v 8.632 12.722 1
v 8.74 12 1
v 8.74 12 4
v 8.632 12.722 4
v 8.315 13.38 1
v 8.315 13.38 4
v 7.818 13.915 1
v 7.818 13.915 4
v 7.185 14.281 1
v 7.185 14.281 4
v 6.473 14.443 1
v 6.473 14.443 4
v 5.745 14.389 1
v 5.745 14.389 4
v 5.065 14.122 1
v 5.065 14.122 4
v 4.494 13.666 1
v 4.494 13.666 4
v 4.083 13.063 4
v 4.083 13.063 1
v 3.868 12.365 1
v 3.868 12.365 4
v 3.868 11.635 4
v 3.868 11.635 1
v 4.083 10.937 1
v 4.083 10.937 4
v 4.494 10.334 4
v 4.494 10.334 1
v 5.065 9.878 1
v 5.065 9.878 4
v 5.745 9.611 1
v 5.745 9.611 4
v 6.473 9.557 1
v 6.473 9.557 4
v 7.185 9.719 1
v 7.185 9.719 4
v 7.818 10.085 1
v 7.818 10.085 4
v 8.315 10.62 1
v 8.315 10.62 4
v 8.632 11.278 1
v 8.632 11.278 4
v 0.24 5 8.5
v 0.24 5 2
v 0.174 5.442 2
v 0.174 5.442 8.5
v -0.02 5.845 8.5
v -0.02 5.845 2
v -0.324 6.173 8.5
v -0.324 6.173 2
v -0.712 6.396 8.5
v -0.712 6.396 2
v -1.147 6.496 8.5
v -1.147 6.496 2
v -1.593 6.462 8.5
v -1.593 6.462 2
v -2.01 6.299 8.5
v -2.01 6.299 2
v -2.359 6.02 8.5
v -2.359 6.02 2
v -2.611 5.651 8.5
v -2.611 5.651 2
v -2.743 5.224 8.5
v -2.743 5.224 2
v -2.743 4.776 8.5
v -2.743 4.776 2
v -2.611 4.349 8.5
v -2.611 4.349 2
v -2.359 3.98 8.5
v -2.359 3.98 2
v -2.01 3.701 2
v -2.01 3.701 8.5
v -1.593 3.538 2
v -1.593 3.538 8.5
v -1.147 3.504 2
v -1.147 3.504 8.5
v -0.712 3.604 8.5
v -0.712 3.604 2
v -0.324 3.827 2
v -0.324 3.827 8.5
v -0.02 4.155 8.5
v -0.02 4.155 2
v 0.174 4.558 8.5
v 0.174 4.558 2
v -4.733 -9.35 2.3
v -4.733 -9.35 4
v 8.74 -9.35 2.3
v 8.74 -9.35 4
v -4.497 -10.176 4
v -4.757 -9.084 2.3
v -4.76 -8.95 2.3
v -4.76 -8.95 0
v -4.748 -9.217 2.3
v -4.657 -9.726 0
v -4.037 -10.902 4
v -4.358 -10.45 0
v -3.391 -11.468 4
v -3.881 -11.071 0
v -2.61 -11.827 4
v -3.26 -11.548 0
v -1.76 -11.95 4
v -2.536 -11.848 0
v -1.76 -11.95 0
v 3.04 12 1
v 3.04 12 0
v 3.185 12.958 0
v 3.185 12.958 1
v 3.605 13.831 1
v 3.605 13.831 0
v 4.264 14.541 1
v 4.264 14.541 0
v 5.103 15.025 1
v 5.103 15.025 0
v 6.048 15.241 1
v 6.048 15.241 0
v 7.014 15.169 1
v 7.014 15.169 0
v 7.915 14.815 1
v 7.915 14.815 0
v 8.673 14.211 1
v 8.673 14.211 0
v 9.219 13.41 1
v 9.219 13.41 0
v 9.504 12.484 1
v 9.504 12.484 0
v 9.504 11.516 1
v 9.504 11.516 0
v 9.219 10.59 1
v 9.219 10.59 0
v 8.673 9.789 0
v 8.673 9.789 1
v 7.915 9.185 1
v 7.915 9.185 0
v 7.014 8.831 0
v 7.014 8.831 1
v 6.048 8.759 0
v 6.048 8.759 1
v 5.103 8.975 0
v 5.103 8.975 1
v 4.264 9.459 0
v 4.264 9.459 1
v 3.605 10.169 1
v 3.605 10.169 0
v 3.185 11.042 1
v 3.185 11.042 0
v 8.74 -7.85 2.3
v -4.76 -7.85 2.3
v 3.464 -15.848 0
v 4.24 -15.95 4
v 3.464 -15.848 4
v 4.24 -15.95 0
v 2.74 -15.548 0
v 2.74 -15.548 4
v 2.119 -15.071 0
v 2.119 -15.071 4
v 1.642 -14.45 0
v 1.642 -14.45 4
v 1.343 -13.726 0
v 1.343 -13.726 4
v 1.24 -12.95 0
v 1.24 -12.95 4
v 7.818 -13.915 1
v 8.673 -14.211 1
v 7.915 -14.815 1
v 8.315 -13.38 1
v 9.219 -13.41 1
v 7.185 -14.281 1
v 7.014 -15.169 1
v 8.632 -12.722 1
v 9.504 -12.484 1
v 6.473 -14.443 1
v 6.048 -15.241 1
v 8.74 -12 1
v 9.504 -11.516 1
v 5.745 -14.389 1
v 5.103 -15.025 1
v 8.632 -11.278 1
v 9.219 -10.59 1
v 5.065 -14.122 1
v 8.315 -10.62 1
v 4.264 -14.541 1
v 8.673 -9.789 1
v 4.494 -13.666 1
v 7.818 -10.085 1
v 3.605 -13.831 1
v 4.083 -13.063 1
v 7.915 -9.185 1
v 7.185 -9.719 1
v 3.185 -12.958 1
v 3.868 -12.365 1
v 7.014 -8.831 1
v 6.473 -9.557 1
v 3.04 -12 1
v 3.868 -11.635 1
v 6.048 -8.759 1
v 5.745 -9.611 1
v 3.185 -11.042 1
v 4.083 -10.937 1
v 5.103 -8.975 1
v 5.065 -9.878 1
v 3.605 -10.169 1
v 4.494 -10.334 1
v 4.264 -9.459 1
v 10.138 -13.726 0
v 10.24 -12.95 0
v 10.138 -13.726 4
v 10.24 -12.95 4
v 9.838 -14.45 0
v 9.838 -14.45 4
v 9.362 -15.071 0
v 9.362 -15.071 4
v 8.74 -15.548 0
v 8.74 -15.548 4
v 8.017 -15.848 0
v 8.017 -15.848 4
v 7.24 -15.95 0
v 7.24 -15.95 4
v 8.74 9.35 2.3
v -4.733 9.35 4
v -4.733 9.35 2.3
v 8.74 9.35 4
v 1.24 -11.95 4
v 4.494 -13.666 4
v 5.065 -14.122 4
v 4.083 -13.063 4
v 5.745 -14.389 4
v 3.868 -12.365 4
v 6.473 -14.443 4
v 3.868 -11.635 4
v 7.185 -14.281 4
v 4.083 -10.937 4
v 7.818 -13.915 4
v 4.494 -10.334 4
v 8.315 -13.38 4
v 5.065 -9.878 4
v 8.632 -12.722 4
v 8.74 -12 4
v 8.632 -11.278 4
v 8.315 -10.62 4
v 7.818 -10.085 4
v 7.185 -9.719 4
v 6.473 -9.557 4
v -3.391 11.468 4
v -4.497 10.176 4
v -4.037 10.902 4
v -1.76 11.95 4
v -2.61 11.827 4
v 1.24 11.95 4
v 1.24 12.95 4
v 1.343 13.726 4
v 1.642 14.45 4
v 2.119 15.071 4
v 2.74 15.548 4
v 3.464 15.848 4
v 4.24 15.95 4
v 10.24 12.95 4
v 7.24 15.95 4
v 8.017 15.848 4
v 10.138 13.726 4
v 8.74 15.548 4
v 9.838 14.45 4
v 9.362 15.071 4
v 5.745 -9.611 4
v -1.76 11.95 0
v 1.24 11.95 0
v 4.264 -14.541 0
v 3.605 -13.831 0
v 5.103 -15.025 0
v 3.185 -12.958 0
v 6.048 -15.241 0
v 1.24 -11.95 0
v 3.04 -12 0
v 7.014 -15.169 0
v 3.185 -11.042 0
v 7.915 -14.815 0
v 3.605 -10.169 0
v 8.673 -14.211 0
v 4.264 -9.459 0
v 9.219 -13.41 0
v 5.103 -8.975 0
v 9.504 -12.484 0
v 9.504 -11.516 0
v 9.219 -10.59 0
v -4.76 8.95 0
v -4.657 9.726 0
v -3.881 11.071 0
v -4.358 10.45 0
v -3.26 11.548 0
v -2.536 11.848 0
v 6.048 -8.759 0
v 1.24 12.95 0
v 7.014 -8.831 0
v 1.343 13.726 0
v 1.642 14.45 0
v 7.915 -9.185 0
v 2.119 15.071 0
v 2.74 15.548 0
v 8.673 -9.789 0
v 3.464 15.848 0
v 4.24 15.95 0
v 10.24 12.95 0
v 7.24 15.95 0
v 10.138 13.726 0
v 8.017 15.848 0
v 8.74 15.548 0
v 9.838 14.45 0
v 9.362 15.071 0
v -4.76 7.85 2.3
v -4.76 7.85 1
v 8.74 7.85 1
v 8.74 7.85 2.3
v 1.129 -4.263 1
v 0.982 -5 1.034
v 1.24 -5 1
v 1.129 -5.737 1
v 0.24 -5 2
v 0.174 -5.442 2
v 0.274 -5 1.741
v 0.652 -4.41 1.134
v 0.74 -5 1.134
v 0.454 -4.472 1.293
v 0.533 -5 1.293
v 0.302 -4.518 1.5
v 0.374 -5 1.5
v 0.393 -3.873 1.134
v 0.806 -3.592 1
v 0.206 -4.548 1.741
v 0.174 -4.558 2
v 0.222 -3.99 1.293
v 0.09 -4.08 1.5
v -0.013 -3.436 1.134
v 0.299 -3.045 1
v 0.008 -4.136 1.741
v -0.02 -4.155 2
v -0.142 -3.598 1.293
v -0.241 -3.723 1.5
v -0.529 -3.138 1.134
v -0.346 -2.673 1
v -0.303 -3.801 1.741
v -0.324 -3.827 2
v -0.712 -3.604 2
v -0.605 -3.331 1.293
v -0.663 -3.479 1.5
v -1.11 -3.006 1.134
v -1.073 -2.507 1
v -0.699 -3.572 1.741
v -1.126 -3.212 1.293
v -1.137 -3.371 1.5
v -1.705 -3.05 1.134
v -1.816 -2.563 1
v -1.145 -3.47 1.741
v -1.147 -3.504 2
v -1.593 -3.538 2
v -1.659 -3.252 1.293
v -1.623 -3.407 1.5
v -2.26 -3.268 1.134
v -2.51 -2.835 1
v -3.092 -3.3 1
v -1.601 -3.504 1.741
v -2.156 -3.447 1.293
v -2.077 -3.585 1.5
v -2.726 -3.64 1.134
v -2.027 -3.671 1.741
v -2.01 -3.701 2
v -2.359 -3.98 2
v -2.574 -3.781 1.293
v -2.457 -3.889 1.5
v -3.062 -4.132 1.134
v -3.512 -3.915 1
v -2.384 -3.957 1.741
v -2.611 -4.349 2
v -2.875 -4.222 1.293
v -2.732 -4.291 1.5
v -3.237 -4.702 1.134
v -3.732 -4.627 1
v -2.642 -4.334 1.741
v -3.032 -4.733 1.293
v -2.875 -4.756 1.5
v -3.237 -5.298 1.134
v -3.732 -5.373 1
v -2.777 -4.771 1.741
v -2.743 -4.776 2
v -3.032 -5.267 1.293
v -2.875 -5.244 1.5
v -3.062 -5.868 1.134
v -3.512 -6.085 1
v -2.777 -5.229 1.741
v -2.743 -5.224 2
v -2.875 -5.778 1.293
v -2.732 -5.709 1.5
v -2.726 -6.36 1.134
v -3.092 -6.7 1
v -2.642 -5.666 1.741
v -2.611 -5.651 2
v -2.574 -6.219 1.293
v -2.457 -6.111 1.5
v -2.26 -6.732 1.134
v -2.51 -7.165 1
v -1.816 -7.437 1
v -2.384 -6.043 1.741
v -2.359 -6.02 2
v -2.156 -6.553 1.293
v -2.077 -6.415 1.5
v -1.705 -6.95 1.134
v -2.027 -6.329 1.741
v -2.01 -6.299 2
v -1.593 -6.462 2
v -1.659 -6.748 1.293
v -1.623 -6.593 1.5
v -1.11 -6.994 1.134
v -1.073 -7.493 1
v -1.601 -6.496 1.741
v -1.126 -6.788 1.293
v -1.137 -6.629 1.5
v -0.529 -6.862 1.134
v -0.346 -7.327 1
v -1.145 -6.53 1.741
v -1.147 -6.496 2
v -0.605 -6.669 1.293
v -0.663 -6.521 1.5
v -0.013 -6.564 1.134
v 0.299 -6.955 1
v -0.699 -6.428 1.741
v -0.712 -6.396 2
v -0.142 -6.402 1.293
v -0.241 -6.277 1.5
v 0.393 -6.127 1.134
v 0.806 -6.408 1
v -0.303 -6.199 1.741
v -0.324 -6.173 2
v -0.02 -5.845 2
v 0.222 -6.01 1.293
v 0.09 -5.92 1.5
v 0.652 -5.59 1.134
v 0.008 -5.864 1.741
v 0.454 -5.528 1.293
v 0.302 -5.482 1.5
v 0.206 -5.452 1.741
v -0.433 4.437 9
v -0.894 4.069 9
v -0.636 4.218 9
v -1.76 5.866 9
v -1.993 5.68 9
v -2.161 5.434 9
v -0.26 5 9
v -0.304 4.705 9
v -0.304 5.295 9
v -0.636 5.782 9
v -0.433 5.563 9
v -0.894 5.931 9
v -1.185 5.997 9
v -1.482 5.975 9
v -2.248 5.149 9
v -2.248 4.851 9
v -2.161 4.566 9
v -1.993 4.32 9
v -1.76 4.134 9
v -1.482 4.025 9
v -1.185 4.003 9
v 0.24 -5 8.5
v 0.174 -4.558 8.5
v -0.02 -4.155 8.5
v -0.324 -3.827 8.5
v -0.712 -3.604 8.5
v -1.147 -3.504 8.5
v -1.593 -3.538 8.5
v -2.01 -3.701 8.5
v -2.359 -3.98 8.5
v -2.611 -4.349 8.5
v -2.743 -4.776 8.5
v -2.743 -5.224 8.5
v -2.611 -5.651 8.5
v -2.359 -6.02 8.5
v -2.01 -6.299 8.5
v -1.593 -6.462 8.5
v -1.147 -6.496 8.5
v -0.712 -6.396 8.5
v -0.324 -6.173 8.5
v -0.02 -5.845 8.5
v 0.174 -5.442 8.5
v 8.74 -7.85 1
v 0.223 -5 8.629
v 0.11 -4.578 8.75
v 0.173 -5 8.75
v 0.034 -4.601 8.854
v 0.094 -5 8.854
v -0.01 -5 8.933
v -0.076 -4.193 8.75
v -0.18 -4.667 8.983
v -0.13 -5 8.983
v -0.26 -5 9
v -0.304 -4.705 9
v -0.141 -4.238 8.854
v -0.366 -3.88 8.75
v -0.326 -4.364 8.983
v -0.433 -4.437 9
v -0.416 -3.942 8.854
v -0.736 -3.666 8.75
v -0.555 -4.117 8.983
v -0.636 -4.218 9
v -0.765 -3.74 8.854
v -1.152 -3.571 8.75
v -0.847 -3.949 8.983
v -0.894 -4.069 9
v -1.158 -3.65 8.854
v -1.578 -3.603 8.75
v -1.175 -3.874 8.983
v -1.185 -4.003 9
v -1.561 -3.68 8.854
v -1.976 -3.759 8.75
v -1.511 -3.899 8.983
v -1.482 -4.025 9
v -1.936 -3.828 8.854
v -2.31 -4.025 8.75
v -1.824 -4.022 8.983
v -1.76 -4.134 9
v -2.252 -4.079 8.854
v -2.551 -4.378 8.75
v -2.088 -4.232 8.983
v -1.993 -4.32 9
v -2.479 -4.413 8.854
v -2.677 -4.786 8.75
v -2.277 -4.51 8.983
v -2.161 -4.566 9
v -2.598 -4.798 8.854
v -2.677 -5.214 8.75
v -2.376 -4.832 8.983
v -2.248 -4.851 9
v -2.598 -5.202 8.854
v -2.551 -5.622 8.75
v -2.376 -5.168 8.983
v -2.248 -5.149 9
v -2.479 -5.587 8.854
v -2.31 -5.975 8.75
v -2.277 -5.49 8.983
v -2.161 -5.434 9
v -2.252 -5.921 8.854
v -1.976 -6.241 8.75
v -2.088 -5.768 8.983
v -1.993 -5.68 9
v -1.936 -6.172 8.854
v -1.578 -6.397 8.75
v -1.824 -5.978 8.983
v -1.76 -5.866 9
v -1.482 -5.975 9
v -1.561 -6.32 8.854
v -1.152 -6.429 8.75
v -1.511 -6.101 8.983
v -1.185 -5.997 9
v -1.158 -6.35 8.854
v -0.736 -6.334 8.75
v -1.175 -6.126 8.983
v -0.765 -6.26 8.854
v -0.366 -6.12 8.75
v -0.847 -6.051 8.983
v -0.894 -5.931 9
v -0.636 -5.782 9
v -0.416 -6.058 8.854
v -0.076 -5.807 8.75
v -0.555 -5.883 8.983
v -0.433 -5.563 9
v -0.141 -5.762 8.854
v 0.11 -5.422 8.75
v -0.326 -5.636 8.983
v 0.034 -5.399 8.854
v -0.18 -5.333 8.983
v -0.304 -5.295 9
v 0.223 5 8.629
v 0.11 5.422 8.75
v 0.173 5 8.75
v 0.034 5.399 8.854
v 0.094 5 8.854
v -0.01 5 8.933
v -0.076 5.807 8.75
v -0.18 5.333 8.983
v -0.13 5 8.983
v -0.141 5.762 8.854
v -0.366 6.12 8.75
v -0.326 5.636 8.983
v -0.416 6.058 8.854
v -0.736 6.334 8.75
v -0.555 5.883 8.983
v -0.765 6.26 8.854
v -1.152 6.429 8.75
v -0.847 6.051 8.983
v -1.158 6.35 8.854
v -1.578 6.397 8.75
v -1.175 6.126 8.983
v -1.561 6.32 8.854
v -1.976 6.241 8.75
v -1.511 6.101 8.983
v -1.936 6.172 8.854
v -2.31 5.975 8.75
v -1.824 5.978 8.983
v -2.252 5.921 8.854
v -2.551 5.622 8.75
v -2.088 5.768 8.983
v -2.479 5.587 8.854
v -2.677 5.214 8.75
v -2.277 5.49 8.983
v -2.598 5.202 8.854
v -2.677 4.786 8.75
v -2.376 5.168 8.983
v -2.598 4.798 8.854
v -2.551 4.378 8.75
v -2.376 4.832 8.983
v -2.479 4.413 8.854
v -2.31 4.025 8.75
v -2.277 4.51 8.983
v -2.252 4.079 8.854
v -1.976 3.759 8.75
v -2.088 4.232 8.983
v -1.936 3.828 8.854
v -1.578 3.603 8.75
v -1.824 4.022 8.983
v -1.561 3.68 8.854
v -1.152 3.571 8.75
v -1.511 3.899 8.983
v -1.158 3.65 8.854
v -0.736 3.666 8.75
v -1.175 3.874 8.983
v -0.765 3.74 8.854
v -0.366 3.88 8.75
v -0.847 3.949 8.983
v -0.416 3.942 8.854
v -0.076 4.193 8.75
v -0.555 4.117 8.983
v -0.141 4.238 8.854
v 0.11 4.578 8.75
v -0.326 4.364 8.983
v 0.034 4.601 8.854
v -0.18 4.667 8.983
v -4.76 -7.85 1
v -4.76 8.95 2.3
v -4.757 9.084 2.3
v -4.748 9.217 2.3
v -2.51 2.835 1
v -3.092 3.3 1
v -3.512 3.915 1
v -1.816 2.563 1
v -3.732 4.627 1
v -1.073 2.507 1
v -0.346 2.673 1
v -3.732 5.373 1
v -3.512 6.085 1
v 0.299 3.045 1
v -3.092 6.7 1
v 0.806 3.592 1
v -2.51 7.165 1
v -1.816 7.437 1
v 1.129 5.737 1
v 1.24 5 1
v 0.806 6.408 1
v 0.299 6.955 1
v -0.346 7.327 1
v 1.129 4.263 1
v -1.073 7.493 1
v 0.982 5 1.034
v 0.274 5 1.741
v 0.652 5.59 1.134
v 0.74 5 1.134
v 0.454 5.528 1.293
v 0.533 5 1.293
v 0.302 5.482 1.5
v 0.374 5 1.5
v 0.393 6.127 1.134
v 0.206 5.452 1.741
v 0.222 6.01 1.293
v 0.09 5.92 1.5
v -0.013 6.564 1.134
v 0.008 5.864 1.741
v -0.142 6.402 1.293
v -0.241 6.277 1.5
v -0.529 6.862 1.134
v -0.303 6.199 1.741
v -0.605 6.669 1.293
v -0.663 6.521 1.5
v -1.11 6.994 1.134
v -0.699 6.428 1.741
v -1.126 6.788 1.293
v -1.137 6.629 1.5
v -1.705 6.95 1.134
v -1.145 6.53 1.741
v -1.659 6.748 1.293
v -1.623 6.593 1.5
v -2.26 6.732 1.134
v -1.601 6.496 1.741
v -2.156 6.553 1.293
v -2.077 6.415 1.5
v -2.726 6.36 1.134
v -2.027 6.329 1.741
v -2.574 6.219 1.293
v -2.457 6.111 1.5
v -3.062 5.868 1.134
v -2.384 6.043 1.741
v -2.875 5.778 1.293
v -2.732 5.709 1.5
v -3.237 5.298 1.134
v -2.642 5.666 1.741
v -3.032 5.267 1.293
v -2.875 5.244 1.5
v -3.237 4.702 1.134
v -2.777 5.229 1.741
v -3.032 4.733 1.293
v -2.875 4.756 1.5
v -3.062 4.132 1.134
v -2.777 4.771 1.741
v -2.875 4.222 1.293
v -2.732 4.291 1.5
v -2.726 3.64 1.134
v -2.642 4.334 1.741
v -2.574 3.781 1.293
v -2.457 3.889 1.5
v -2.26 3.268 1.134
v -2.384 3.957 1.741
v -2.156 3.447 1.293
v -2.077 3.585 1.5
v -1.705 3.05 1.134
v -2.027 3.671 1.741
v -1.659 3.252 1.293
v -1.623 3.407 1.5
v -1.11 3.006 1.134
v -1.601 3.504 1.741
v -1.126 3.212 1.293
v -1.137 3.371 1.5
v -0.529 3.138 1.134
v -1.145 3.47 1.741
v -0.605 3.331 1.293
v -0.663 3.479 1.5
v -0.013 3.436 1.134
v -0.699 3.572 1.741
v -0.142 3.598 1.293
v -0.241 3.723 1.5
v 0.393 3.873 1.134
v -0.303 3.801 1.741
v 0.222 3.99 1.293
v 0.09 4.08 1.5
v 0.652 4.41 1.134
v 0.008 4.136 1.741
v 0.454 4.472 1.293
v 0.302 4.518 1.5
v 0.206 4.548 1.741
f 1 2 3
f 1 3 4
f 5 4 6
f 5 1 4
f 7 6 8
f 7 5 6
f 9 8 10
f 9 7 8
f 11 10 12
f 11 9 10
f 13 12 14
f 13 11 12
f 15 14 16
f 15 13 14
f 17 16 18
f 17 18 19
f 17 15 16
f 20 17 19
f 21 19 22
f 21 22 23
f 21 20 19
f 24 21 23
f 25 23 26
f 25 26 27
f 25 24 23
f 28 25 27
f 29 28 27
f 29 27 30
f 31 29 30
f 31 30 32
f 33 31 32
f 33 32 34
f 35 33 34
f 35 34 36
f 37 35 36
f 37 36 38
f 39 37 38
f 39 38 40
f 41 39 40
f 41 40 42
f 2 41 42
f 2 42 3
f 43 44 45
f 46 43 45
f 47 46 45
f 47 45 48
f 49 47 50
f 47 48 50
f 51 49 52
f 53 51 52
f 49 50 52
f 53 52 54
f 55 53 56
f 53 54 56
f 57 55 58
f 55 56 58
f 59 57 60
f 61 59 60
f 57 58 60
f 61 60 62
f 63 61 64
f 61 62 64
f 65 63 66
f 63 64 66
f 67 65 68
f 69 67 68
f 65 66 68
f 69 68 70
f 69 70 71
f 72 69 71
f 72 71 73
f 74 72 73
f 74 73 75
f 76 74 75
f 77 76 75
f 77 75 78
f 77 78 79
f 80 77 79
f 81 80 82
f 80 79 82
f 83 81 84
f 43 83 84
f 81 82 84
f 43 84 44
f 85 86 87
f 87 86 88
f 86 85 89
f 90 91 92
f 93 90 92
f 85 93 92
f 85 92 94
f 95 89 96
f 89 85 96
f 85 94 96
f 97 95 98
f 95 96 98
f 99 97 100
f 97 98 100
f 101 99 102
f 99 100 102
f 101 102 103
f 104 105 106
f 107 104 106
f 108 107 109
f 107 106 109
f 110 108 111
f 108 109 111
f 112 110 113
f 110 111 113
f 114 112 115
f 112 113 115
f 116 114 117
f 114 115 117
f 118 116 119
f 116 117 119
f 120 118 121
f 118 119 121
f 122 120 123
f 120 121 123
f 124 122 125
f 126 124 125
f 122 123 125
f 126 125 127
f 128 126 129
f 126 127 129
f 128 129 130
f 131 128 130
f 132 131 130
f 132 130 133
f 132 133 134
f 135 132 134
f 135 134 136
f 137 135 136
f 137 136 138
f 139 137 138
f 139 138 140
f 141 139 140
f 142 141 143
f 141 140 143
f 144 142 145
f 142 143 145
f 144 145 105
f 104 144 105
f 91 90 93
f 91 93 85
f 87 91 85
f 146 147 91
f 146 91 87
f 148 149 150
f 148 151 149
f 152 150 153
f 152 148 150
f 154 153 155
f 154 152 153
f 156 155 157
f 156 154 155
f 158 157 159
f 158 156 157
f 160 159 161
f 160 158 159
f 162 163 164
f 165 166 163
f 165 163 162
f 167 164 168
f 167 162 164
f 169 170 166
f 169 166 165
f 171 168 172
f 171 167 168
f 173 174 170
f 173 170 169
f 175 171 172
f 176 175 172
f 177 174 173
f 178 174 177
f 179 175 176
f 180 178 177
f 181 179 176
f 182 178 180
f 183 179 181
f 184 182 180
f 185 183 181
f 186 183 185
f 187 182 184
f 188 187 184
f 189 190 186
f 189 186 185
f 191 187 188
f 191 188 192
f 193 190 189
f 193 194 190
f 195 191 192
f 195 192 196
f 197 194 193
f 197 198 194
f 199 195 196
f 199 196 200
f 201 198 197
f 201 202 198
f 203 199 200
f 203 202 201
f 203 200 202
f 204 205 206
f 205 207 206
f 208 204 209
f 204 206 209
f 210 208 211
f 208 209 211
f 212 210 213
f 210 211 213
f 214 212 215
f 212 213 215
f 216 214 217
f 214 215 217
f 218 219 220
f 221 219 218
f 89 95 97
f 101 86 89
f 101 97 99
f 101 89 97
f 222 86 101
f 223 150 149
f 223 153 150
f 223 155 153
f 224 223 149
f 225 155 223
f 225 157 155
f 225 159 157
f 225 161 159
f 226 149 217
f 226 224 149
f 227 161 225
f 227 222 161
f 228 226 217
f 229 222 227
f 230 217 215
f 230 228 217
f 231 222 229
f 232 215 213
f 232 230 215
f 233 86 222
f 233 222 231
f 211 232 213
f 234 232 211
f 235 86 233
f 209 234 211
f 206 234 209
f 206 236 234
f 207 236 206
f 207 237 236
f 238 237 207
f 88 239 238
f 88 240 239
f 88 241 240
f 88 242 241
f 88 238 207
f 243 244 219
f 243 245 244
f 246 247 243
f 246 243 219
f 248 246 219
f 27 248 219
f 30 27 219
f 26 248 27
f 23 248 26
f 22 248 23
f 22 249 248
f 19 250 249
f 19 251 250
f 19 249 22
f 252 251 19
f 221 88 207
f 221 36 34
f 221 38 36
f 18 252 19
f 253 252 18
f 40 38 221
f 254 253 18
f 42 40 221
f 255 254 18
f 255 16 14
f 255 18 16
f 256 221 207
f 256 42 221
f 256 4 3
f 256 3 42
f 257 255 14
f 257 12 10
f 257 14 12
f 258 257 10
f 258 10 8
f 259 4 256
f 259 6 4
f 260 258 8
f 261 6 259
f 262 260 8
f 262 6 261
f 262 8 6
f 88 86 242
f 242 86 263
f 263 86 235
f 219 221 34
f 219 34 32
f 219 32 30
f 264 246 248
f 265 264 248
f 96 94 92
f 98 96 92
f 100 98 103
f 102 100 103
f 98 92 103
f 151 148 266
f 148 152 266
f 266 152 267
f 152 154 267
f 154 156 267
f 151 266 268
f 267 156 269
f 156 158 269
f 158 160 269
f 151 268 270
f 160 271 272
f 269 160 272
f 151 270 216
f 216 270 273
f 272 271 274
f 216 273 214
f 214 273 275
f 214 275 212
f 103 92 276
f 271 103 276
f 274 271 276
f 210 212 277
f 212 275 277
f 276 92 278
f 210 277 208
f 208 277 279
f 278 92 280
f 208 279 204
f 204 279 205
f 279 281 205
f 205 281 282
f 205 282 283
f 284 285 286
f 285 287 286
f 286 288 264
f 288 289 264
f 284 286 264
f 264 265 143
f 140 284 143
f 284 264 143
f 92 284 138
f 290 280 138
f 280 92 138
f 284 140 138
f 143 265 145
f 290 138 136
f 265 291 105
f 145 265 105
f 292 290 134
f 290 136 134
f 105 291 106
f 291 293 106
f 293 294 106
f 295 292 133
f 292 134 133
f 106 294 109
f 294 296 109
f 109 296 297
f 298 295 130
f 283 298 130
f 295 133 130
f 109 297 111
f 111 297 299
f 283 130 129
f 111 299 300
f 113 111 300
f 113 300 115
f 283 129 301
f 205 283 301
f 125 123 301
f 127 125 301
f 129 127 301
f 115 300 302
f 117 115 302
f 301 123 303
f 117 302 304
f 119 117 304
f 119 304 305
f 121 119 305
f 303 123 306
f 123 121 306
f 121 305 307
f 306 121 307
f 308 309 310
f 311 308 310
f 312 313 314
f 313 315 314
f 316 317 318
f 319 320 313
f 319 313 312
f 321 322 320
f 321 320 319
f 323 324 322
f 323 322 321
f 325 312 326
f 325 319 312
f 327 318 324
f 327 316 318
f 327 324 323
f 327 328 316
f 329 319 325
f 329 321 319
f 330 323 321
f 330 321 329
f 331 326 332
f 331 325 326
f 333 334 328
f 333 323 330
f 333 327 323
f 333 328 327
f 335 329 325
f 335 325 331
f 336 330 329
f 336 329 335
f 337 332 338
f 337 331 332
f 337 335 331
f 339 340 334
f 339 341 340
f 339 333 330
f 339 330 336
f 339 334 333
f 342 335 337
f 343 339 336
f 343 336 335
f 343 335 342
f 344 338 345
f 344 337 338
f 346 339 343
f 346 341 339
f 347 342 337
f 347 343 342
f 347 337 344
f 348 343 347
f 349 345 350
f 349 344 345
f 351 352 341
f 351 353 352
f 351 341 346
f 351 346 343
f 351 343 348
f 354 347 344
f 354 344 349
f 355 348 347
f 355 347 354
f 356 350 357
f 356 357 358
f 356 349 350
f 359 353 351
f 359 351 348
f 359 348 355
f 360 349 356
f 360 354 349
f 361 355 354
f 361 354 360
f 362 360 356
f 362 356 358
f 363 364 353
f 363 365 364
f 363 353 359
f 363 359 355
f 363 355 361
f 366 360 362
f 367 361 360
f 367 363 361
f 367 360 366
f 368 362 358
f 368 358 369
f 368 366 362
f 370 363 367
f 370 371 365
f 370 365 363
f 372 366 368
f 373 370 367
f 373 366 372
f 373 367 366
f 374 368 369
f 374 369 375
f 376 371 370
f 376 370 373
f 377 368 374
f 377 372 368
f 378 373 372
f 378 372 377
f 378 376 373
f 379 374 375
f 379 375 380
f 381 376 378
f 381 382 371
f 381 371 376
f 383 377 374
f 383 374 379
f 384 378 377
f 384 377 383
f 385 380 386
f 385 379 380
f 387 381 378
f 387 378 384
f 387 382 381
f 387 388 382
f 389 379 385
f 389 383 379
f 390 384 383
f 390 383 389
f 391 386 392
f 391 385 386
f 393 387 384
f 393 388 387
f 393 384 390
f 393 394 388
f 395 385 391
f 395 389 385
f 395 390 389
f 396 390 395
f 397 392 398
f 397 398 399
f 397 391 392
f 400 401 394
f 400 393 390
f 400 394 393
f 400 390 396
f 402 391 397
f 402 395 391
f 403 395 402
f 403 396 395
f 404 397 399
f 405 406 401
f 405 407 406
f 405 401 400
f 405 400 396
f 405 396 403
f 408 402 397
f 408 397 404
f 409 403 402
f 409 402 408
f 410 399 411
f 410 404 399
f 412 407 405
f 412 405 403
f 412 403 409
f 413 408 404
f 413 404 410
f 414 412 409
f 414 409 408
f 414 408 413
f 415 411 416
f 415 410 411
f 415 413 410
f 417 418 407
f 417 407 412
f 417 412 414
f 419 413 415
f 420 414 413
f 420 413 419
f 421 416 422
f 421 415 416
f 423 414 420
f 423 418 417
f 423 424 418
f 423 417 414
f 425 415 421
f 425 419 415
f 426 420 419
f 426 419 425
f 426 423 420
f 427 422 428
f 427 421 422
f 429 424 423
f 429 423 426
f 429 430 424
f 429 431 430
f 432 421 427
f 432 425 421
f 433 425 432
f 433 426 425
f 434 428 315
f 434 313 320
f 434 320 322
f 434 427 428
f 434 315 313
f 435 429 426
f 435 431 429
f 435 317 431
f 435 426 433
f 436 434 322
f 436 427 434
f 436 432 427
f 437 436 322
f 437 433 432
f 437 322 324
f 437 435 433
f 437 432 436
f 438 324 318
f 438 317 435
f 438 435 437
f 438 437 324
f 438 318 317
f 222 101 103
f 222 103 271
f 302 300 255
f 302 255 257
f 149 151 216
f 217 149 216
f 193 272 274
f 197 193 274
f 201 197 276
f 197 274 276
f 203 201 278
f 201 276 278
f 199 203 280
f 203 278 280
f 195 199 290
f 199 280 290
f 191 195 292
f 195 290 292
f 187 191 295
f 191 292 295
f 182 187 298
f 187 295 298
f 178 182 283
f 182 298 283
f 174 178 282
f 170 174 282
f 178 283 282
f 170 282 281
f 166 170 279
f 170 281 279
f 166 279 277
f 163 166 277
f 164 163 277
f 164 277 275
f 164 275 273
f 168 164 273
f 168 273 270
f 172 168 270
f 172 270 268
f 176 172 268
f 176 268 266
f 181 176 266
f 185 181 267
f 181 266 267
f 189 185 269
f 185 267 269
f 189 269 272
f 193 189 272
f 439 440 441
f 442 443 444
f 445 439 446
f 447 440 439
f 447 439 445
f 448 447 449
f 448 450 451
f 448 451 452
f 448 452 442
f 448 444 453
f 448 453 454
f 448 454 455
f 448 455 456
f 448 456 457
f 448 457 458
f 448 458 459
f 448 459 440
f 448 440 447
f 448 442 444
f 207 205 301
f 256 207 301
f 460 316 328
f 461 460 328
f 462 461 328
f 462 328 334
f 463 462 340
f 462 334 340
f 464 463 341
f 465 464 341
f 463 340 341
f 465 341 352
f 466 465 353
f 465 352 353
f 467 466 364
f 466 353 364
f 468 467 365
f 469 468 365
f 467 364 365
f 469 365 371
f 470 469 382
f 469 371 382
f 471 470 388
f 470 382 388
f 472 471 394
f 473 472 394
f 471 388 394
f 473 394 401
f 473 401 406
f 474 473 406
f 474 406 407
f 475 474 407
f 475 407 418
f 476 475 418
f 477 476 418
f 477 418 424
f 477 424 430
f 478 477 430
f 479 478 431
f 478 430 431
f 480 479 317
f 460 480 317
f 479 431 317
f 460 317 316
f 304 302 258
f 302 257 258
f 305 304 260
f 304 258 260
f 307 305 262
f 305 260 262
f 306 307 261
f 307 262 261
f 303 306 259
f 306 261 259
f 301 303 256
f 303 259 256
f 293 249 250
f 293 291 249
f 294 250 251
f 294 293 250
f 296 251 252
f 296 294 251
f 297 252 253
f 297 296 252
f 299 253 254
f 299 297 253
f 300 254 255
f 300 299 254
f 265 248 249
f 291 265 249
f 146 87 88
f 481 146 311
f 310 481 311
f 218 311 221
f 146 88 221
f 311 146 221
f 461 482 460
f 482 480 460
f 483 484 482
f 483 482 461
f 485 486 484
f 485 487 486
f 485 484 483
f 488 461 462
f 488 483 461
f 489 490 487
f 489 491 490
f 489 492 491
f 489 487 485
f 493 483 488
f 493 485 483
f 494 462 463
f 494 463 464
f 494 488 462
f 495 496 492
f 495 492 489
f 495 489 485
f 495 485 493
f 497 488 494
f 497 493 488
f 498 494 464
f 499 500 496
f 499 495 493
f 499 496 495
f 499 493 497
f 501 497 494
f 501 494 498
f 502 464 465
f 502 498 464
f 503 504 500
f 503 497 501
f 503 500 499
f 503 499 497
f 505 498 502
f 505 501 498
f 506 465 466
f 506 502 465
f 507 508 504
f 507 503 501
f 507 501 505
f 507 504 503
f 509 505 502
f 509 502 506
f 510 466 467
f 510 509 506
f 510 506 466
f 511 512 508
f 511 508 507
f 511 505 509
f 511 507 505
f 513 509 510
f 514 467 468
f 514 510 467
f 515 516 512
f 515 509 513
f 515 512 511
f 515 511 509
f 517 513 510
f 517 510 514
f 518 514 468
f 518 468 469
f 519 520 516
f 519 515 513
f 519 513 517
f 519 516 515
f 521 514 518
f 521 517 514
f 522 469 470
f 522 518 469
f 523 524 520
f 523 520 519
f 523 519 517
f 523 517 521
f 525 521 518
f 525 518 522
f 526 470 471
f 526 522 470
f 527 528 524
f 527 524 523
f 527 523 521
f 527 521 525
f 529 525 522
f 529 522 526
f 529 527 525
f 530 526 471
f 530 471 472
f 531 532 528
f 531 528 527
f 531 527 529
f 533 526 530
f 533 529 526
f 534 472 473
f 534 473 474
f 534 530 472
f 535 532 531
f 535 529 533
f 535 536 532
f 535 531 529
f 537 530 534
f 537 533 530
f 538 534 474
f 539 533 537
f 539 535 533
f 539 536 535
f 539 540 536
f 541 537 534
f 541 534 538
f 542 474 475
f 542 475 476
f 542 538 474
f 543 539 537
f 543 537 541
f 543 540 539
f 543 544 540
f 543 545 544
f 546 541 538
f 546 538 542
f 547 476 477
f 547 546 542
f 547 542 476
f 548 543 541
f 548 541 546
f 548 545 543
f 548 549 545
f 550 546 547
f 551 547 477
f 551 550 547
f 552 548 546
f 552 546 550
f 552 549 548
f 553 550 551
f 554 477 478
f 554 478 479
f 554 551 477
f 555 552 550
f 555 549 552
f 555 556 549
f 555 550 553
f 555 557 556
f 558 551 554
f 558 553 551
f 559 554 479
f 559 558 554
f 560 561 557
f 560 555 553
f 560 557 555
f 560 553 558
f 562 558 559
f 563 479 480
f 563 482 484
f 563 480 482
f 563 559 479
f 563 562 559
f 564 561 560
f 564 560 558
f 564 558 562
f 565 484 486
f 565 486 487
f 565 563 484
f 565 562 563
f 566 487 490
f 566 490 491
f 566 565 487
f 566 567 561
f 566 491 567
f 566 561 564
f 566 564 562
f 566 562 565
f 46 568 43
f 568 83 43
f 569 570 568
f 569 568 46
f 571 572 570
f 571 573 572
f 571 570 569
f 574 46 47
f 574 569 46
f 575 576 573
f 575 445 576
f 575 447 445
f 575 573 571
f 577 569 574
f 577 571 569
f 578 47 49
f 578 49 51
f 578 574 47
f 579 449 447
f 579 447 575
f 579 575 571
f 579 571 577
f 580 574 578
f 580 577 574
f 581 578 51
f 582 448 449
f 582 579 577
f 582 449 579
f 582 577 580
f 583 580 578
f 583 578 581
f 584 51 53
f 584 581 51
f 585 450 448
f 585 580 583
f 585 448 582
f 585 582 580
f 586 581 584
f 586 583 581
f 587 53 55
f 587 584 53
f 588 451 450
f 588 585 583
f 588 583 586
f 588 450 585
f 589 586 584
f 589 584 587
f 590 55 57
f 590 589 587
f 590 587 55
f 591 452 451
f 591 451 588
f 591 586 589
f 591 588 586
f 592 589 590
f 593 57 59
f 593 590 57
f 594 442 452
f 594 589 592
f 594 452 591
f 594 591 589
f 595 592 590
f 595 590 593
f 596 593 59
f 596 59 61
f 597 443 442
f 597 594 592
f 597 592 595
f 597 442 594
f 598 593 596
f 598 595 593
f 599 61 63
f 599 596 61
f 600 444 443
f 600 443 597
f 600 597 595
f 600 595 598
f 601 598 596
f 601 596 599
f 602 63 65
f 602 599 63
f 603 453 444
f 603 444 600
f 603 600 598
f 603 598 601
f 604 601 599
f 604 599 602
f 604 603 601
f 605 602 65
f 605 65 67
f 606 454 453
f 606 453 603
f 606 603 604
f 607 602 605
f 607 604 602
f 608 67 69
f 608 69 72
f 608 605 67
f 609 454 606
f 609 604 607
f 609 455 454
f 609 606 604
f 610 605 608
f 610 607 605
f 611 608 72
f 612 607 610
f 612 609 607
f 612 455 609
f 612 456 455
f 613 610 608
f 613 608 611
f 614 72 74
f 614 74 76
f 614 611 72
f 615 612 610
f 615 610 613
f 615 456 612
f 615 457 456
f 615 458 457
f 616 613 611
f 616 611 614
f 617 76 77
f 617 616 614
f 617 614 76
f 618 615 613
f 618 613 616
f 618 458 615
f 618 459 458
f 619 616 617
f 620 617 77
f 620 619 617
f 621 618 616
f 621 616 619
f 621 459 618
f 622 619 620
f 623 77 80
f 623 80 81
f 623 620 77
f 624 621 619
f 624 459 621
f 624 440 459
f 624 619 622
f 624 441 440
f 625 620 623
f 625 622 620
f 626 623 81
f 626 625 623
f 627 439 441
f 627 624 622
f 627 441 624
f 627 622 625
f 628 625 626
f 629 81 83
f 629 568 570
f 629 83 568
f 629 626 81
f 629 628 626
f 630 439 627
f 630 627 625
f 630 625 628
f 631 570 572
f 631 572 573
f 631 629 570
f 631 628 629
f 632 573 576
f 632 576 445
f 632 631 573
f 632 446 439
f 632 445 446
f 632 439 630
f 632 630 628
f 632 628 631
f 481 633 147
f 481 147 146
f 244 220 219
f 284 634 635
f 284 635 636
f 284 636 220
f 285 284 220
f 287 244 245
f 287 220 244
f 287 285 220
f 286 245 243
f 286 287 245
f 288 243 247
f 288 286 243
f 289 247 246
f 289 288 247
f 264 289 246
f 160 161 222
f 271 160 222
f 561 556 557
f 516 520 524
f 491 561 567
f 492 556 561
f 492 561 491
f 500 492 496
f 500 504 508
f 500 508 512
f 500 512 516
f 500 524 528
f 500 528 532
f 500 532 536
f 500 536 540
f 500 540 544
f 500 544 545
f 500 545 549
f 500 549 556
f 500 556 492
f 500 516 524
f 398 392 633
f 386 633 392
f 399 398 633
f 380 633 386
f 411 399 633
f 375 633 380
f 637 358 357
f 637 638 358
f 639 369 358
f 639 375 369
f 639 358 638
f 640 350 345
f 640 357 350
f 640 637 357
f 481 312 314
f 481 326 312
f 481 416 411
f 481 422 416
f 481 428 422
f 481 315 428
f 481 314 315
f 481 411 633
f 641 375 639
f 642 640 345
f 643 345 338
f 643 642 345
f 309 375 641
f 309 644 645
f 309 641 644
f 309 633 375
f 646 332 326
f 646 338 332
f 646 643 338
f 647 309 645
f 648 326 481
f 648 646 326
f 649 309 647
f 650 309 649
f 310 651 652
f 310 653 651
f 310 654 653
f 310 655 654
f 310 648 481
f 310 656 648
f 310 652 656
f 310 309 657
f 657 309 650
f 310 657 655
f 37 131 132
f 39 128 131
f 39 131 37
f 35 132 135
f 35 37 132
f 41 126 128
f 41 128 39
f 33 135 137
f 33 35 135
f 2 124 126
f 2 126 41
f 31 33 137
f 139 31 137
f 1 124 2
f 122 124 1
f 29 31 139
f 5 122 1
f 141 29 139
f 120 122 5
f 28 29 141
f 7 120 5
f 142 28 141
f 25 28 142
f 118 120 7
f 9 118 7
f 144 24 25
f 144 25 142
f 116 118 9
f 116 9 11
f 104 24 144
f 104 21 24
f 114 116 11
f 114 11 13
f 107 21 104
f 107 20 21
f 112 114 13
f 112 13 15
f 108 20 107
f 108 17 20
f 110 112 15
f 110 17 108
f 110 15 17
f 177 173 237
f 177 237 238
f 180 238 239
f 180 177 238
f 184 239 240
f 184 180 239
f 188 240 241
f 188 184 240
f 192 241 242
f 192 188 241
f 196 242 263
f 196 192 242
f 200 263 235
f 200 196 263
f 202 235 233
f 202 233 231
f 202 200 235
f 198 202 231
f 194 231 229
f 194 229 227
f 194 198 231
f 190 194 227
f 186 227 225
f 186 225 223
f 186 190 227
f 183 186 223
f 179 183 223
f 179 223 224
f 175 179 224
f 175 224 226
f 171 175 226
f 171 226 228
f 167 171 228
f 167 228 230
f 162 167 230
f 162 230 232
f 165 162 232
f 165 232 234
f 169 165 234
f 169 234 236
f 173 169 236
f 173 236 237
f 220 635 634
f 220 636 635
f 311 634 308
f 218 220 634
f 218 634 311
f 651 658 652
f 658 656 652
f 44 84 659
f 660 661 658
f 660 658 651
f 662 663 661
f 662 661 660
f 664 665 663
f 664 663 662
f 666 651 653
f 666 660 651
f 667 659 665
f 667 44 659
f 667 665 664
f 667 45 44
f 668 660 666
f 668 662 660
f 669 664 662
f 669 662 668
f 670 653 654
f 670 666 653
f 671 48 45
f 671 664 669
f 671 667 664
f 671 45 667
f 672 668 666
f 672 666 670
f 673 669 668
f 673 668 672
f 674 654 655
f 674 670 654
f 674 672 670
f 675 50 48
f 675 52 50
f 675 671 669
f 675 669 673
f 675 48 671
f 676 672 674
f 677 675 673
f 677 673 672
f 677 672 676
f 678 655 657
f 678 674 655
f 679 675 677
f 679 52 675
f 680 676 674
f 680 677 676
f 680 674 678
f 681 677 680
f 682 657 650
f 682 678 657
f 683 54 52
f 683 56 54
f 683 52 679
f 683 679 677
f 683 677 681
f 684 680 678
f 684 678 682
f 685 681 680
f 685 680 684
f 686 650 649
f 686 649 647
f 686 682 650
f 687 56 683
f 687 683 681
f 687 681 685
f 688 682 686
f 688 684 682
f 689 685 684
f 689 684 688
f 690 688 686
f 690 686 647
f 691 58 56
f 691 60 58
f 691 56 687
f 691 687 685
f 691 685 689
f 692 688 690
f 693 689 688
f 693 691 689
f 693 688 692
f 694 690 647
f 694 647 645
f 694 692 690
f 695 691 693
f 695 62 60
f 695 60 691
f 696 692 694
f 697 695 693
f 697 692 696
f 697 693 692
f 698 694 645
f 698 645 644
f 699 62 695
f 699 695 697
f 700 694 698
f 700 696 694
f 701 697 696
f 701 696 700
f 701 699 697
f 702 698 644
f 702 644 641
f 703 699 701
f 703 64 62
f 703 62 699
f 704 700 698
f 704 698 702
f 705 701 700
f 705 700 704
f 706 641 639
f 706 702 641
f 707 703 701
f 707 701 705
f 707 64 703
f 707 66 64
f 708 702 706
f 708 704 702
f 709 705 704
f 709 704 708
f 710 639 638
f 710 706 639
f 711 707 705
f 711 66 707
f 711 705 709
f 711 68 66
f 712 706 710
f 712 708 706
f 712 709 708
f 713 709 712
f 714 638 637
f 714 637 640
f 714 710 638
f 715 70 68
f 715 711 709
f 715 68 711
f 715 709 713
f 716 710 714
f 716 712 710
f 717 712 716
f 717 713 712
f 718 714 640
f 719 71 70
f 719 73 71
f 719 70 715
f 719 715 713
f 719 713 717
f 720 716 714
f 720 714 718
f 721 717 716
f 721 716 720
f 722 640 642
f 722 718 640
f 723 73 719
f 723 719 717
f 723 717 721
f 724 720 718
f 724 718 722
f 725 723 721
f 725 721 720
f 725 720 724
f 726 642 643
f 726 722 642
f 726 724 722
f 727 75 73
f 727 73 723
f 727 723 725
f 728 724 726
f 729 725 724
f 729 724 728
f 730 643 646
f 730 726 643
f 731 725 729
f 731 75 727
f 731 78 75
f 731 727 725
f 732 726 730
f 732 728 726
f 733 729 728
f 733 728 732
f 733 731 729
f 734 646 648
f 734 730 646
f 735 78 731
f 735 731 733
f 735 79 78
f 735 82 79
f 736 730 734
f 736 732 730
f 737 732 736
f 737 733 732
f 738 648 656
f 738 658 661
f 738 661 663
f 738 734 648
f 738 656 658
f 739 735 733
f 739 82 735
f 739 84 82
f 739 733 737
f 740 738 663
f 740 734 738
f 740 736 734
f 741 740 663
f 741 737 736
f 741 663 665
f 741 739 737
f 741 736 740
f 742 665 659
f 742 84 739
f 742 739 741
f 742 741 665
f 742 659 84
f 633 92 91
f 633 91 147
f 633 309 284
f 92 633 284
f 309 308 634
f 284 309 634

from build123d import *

# Parameters (mm, degrees)
SKETCH1_W           = 20.480821918
SKETCH1_H           = 31.9
SKETCH1_R           = 2.45
BOSS_EXTRUDE1_DEPTH = 4
SKETCH2_W           = 18.980821918
SKETCH2_H           = 9.35
CUT_EXTRUDE1_DEPTH  = 3
SKETCH3_R           = 1.5
BOSS_EXTRUDE2_DEPTH = 8
SKETCH4_W           = 18.980821918
SKETCH4_H           = 1.5
BOSS_EXTRUDE3_DEPTH = 1.3
SKETCH5_W           = 5.480821918
SKETCH5_H           = 31.9
CUT_EXTRUDE2_DEPTH  = 7.4
SKETCH6_W           = 6
SKETCH6_H           = 4
CUT_EXTRUDE3_DEPTH  = 4
FILLET1_R           = 3
FILLET2_R           = 1
FILLET3_R           = 0.5
SKETCH7_R           = 3.25
CUT_EXTRUDE4_DEPTH  = 1


with BuildPart() as part:
    # Sketch1 → Boss-Extrude1 (new body)
    with BuildSketch(Plane.XY):
        Rectangle(SKETCH1_W, SKETCH1_H)
        with Locations((6.290410959, 12)):
            Circle(SKETCH1_R, mode=Mode.SUBTRACT)
        with Locations((6.290410959, -12)):
            Circle(SKETCH1_R, mode=Mode.SUBTRACT)
    extrude(amount=BOSS_EXTRUDE1_DEPTH)

    # Sketch2 → Cut-Extrude1 (cut)
    with BuildSketch(Plane.XY.offset(4)):
        with Locations((-0.75, 4.675)):
            Rectangle(SKETCH2_W, SKETCH2_H)
        with Locations((-0.75, -4.675)):
            Rectangle(SKETCH2_W, SKETCH2_H)
    extrude(amount=-CUT_EXTRUDE1_DEPTH, mode=Mode.SUBTRACT)

    # Sketch3 → Boss-Extrude2 (add)
    with BuildSketch(Plane.XY.offset(1)):
        with Locations((-1.259589041, 5)):
            Circle(SKETCH3_R)
        with Locations((-1.259589041, -5)):
            Circle(SKETCH3_R)
    extrude(amount=BOSS_EXTRUDE2_DEPTH)

    # Sketch4 → Boss-Extrude3 (add)
    with BuildSketch(Plane.XY.offset(1)):
        with Locations((-0.75, 8.6)):
            Rectangle(SKETCH4_W, SKETCH4_H)
        with Locations((-0.75, -8.6)):
            Rectangle(SKETCH4_W, SKETCH4_H)
    extrude(amount=BOSS_EXTRUDE3_DEPTH)

    # Sketch5 → Cut-Extrude2 (cut)
    with BuildSketch(Plane.XY.offset(4)):
        with Locations((-7.5, 0)):
            Rectangle(SKETCH5_W, SKETCH5_H)
    extrude(amount=-CUT_EXTRUDE2_DEPTH, mode=Mode.SUBTRACT)

    # Sketch6 → Cut-Extrude3 (cut)
    with BuildSketch(Plane.XY.offset(4)):
        with Locations((-1.759589041, 13.95)):
            Rectangle(SKETCH6_W, SKETCH6_H)
        with Locations((-1.759589041, -13.95)):
            Rectangle(SKETCH6_W, SKETCH6_H)
    extrude(amount=-CUT_EXTRUDE3_DEPTH, mode=Mode.SUBTRACT)

    # Fillet1
    fillet1_edges = [part.edges().sort_by_distance(p)[0] for p in [
        (10.240410959, 15.95, 2),
        (10.240410959, -15.95, 2),
        (1.240410959, -15.95, 2),
        (-4.759589041, -11.95, 2),
        (-4.759589041, 11.95, 2),
        (1.240410959, 15.95, 2),
    ]]
    fillet(fillet1_edges, radius=FILLET1_R)

    # Fillet2
    fillet2_edges = [part.edges().sort_by_distance(p)[0] for p in [
        (-2.759589041, 5, 1),
        (-2.759589041, -5, 1),
    ]]
    fillet(fillet2_edges, radius=FILLET2_R)

    # Fillet3
    fillet3_edges = [part.edges().sort_by_distance(p)[0] for p in [
        (-2.759589041, 5, 9),
        (-2.759589041, -5, 9),
    ]]
    fillet(fillet3_edges, radius=FILLET3_R)

    # Sketch7 → Cut-Extrude4 (cut)
    with BuildSketch(Plane(origin=(0, 0, 0), x_dir=(-1, 0, 0), z_dir=(0, 0, -1))):
        with Locations((-6.290410959, 12)):
            Circle(SKETCH7_R)
        with Locations((-6.290410959, -12)):
            Circle(SKETCH7_R)
    extrude(amount=-CUT_EXTRUDE4_DEPTH, mode=Mode.SUBTRACT)


solid = part.part
